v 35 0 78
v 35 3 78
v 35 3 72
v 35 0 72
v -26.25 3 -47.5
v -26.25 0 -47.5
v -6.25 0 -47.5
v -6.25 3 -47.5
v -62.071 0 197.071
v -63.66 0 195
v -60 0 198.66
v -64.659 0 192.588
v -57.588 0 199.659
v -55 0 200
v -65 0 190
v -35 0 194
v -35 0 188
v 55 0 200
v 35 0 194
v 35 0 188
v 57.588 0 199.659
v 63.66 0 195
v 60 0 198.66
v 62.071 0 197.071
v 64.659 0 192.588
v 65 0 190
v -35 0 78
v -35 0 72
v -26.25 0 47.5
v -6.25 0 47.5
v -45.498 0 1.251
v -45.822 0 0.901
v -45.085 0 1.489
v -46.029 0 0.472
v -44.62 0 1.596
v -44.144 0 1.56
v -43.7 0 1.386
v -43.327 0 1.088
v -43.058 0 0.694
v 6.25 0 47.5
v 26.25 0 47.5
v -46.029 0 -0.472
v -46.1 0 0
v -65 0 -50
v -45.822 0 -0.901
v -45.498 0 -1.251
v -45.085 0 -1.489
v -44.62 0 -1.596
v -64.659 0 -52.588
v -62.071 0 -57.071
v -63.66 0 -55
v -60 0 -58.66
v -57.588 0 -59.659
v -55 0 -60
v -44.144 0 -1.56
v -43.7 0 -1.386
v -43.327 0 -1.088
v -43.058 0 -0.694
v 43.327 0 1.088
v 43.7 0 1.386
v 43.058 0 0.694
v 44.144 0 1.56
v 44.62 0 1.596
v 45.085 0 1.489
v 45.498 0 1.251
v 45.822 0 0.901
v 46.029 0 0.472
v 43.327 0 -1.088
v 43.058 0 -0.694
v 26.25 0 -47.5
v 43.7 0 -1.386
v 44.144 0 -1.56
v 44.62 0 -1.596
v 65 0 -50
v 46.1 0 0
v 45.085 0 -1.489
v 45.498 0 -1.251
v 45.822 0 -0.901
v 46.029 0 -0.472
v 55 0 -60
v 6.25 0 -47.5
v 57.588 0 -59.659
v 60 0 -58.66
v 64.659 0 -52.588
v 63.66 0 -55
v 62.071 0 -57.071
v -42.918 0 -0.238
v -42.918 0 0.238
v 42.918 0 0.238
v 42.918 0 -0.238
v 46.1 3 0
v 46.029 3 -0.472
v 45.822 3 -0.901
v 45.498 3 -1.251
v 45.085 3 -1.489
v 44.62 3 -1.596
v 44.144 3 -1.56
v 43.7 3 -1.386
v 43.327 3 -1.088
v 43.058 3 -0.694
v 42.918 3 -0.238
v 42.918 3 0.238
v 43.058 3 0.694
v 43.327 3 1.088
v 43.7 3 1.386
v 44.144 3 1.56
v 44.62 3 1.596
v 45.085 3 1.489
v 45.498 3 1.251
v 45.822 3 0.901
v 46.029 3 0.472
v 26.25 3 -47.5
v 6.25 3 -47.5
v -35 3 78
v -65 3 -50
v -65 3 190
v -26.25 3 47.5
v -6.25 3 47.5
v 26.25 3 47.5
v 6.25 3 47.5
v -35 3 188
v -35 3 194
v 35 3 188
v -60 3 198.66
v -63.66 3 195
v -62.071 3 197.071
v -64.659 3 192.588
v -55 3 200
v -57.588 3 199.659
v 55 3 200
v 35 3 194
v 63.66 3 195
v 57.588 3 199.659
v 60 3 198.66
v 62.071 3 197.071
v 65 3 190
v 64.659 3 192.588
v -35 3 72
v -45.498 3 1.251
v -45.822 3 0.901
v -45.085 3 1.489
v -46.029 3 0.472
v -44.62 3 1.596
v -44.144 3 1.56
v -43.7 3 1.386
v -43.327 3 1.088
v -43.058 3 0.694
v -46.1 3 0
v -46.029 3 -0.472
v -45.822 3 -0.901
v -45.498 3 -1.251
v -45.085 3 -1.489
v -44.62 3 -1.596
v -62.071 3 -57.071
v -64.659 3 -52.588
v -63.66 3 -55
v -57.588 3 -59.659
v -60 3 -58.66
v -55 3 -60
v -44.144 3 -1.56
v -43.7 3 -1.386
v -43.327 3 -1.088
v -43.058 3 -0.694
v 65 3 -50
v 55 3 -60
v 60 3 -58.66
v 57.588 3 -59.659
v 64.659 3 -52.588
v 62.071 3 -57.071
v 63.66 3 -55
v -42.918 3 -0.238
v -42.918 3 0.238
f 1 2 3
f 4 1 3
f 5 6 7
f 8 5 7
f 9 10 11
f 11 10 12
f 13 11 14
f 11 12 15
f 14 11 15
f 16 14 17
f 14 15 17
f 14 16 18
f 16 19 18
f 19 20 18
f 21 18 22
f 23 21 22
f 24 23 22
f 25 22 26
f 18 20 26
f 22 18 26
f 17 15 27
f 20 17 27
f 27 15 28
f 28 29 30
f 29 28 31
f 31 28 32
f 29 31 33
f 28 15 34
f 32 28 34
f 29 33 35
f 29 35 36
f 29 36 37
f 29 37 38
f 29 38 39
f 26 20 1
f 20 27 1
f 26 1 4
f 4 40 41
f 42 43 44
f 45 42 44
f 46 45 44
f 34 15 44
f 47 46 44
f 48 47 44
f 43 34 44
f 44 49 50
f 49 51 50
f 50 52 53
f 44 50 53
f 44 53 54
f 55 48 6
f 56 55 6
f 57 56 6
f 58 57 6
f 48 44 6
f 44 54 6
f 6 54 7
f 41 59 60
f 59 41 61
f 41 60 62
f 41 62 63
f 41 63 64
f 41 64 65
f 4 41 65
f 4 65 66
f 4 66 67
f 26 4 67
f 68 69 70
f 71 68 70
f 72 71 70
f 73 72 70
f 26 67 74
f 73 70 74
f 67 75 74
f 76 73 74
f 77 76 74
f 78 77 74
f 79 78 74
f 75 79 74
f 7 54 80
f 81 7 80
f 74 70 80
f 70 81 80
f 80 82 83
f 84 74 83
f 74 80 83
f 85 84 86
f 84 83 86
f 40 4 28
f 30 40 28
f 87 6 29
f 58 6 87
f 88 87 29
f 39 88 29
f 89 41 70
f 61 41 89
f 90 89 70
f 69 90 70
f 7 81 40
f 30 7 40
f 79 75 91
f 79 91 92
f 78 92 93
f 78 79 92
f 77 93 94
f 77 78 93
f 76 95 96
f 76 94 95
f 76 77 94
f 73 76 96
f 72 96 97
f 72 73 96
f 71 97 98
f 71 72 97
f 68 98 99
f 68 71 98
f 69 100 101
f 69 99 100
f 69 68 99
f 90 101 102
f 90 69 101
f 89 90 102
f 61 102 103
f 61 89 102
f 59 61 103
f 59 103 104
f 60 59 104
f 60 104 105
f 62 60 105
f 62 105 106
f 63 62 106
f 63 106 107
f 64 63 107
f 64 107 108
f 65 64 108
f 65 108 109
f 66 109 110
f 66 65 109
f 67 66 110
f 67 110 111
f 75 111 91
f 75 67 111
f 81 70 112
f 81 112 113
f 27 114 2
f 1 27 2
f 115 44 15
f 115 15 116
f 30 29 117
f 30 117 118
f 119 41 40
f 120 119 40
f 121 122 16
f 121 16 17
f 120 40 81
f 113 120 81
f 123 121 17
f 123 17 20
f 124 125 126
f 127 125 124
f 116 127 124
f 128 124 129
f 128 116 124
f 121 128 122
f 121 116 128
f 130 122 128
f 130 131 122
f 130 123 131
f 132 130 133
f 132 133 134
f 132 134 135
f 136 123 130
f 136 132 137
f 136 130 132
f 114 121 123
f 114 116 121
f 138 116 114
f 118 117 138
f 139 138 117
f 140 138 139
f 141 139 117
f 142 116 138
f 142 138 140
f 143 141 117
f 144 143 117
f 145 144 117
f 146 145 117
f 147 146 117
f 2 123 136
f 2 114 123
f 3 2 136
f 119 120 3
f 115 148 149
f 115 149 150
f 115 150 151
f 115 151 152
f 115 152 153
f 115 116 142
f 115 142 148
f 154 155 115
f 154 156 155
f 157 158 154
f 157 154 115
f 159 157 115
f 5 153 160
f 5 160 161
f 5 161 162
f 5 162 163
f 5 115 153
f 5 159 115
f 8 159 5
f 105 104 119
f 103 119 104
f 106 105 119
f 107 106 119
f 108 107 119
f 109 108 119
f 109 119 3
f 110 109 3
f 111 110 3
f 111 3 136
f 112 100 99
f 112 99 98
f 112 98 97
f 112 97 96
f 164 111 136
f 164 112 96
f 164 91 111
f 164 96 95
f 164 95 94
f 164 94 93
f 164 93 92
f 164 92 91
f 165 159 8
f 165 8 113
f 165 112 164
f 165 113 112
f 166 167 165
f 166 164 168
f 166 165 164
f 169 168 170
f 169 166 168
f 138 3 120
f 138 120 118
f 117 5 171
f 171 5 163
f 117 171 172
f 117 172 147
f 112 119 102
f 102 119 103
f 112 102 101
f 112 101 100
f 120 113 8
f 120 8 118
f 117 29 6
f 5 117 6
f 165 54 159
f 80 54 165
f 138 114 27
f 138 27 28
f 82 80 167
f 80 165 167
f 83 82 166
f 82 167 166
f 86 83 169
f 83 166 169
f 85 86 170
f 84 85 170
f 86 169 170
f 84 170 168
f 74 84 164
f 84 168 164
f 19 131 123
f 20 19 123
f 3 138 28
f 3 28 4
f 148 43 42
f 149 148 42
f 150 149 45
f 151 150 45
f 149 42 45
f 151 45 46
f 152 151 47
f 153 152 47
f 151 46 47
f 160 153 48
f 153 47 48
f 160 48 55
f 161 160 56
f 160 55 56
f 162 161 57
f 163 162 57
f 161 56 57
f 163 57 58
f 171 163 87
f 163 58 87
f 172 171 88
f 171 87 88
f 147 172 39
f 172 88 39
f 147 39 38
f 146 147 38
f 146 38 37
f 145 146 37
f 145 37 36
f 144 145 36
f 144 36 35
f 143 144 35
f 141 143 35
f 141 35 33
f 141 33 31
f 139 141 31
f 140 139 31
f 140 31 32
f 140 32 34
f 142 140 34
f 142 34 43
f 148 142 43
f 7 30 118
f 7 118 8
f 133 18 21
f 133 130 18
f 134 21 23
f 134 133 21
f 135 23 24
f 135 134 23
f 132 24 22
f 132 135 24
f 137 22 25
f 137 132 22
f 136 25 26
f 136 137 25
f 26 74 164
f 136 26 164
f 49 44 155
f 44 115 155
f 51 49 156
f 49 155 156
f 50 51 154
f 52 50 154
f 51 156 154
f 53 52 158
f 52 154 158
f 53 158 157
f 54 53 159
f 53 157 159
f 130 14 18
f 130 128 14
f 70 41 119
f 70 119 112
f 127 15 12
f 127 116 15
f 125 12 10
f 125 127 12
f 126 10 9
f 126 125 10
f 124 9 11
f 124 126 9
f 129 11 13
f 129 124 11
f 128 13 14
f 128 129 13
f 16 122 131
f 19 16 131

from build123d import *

# Parameters (mm, degrees)
SKETCH1_W               = 130
SKETCH1_H               = 120
BOSS_EXTRUDE1_DEPTH     = 3
CUT_EXTRUDE1_START      = -4
SKETCH2_W               = 20
SKETCH2_H               = 95
CUT_EXTRUDE1_DEPTH      = 5
CUT_EXTRUDE2_START      = -4
SKETCH3_R               = 1.6
CUT_EXTRUDE2_DEPTH      = 5
SKETCH4_W               = 130
SKETCH4_H               = 3
BOSS_EXTRUDE2_DEPTH     = 140
SKETCH5_W               = 70
SKETCH5_H               = 6
CUT_EXTRUDE3_DEPTH      = 1
CUT_EXTRUDE3_DEPTH_BACK = 4
FILLET1_R               = 10


with BuildPart() as part:
    # Sketch1 → Boss-Extrude1 (new body)
    with BuildSketch(Plane(origin=(0, 0, 0), x_dir=(1, 0, 0), z_dir=(0, 1, 0))):
        Rectangle(SKETCH1_W, SKETCH1_H)
    extrude(amount=BOSS_EXTRUDE1_DEPTH)

    # Sketch2 → Cut-Extrude1 (cut)
    with BuildSketch(Plane(origin=(0, 3, 0), x_dir=(1, 0, 0), z_dir=(0, 1, 0)).offset(CUT_EXTRUDE1_START)):
        with Locations((-16.25, 0)):
            Rectangle(SKETCH2_W, SKETCH2_H)
    cut_extrude1 = extrude(amount=CUT_EXTRUDE1_DEPTH, mode=Mode.SUBTRACT)

    # Mirror1: Cut-Extrude1 across plane
    add(cut_extrude1.mirror(Plane(origin=(0, 0, 0), x_dir=(0, 0, 1), z_dir=(1, 0, 0))), mode=Mode.SUBTRACT)

    # Sketch3 → Cut-Extrude2 (cut)
    with BuildSketch(Plane(origin=(0, 3, 0), x_dir=(1, 0, 0), z_dir=(0, 1, 0)).offset(CUT_EXTRUDE2_START)):
        with Locations((44.5, 0)):
            Circle(SKETCH3_R)
    cut_extrude2 = extrude(amount=CUT_EXTRUDE2_DEPTH, mode=Mode.SUBTRACT)

    # Mirror2: Cut-Extrude2 across plane
    add(cut_extrude2.mirror(Plane(origin=(0, 0, 0), x_dir=(0, 0, 1), z_dir=(1, 0, 0))), mode=Mode.SUBTRACT)

    # Sketch4 → Boss-Extrude2 (add)
    with BuildSketch(Plane.XY.offset(60)):
        with Locations((0, 1.5)):
            Rectangle(SKETCH4_W, SKETCH4_H)
    extrude(amount=BOSS_EXTRUDE2_DEPTH)

    # Sketch5 → Cut-Extrude3 (cut, two sides)
    with BuildSketch(Plane(origin=(0, 3, 0), x_dir=(1, 0, 0), z_dir=(0, 1, 0))) as cut_extrude3_sk:
        with Locations((0, -75)):
            Rectangle(SKETCH5_W, SKETCH5_H)
        with Locations((0, -191)):
            Rectangle(SKETCH5_W, SKETCH5_H)
    extrude(amount=CUT_EXTRUDE3_DEPTH, mode=Mode.SUBTRACT)
    extrude(cut_extrude3_sk.sketch, amount=-CUT_EXTRUDE3_DEPTH_BACK, mode=Mode.SUBTRACT)

    # Fillet1
    fillet1_edges = [part.edges().sort_by_distance(p)[0] for p in [
        (-65, 1.5, 200),
        (65, 1.5, 200),
        (-65, 1.5, -60),
        (65, 1.5, -60),
    ]]
    fillet(fillet1_edges, radius=FILLET1_R)


solid = part.part
